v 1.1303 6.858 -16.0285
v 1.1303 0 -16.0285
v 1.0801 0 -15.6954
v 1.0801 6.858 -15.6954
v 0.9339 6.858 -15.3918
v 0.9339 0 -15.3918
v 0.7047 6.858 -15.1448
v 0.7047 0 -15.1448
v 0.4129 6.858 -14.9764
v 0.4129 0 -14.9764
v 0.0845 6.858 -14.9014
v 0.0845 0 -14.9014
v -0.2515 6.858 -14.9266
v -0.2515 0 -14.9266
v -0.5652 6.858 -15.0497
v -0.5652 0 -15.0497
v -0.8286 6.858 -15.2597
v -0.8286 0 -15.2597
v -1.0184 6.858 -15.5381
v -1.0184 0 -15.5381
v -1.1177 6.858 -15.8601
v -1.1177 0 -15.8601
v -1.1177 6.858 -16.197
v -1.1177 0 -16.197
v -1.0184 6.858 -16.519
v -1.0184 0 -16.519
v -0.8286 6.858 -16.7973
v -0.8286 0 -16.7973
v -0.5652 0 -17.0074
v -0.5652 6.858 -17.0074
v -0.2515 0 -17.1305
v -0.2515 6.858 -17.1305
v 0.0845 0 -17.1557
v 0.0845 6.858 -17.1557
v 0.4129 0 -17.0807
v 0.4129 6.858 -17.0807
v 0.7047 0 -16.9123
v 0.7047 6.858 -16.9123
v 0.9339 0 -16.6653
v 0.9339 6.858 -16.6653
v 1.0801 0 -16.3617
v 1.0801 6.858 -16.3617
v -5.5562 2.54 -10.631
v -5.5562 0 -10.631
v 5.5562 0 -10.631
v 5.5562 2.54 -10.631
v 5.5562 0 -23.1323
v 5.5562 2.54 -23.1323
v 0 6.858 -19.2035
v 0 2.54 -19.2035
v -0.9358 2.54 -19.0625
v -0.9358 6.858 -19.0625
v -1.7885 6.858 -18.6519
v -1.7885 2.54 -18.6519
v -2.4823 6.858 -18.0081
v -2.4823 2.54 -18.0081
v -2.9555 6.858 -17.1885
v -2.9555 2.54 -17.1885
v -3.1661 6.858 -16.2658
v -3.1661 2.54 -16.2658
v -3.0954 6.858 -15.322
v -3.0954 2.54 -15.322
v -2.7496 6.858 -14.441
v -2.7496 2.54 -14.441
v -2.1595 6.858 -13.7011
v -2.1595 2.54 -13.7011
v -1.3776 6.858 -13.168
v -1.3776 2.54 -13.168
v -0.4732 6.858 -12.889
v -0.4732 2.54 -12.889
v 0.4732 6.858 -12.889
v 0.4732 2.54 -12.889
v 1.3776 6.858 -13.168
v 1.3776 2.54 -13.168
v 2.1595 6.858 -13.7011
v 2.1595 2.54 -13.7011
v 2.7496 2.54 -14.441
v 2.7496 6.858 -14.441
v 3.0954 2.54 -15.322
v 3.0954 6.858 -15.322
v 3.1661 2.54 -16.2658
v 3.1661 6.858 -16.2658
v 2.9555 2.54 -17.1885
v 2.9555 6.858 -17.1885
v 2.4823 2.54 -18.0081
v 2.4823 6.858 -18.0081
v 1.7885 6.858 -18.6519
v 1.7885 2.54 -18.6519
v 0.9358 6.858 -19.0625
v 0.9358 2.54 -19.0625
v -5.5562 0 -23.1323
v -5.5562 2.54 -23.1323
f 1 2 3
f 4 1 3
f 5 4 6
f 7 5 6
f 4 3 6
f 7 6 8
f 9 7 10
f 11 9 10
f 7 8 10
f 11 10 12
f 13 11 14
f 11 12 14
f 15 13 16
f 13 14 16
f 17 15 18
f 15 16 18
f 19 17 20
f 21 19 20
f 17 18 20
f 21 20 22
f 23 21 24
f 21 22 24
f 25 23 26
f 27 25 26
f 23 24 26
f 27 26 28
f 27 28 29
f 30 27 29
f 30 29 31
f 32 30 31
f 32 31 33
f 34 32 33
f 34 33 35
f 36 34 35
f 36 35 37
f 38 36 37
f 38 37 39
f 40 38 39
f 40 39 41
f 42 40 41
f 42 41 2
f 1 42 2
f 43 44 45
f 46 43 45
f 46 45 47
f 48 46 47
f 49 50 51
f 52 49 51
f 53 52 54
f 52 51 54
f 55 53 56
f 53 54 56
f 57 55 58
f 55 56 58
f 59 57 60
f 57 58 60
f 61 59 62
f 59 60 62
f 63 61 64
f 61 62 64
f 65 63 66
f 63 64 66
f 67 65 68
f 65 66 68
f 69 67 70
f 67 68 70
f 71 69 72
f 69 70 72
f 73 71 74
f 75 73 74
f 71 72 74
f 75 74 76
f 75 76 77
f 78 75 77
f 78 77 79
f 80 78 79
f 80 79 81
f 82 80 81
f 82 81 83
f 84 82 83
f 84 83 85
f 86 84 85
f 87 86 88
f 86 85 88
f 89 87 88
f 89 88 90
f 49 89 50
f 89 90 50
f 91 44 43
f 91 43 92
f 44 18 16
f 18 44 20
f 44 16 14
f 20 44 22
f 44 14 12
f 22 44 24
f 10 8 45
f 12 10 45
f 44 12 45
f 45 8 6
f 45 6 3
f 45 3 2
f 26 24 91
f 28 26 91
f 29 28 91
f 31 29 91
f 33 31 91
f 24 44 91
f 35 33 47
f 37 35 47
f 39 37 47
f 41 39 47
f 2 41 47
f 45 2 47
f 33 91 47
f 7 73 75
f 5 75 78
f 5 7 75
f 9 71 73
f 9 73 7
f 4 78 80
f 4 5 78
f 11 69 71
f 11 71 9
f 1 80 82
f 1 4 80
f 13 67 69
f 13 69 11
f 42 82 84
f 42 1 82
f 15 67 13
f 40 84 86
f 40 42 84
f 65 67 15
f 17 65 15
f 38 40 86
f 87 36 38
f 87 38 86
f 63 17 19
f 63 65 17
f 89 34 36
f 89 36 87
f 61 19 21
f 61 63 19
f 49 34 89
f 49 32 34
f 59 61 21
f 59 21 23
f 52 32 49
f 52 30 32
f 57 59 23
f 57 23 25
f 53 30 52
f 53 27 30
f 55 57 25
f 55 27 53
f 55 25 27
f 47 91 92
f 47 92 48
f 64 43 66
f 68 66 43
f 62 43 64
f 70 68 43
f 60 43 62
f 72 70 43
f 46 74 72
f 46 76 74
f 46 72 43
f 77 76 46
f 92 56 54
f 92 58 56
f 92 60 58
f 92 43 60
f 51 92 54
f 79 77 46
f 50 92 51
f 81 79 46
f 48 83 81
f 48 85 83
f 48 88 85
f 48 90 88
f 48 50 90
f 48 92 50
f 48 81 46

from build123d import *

# Parameters (mm, degrees)
SKETCH1_W             = 11.1125
SKETCH1_H             = 12.50125
BOSS_EXTRUDE1_DEPTH   = 2.54
SKETCH2_R             = 3.175
BOSS_EXTRUDE2_DEPTH   = 4.318
F_4_40_TAPPED_HOLE1_D = 2.2606


with BuildPart() as part:
    # Sketch1 → Boss-Extrude1 (new body)
    with BuildSketch(Plane(origin=(0, 0, 0), x_dir=(1, 0, 0), z_dir=(0, 1, 0))):
        with Locations((0, 16.881673618)):
            Rectangle(SKETCH1_W, SKETCH1_H)
    extrude(amount=BOSS_EXTRUDE1_DEPTH)

    # Sketch2 → Boss-Extrude2 (add)
    with BuildSketch(Plane(origin=(0, 2.54, 0), x_dir=(1, 0, 0), z_dir=(0, 1, 0))):
        with Locations(Location((0, 16.028548618, 0), (0, 0, 90))):
            Circle(SKETCH2_R)
    extrude(amount=BOSS_EXTRUDE2_DEPTH)

    # #4-40 Tapped Hole1 (through all)
    with Locations(Plane(origin=(0, 6.858, 0), x_dir=(-1, 0, 0), z_dir=(0, 1, 0))):
        with Locations((0, -16.028548618)):
            Hole(F_4_40_TAPPED_HOLE1_D / 2)


solid = part.part
